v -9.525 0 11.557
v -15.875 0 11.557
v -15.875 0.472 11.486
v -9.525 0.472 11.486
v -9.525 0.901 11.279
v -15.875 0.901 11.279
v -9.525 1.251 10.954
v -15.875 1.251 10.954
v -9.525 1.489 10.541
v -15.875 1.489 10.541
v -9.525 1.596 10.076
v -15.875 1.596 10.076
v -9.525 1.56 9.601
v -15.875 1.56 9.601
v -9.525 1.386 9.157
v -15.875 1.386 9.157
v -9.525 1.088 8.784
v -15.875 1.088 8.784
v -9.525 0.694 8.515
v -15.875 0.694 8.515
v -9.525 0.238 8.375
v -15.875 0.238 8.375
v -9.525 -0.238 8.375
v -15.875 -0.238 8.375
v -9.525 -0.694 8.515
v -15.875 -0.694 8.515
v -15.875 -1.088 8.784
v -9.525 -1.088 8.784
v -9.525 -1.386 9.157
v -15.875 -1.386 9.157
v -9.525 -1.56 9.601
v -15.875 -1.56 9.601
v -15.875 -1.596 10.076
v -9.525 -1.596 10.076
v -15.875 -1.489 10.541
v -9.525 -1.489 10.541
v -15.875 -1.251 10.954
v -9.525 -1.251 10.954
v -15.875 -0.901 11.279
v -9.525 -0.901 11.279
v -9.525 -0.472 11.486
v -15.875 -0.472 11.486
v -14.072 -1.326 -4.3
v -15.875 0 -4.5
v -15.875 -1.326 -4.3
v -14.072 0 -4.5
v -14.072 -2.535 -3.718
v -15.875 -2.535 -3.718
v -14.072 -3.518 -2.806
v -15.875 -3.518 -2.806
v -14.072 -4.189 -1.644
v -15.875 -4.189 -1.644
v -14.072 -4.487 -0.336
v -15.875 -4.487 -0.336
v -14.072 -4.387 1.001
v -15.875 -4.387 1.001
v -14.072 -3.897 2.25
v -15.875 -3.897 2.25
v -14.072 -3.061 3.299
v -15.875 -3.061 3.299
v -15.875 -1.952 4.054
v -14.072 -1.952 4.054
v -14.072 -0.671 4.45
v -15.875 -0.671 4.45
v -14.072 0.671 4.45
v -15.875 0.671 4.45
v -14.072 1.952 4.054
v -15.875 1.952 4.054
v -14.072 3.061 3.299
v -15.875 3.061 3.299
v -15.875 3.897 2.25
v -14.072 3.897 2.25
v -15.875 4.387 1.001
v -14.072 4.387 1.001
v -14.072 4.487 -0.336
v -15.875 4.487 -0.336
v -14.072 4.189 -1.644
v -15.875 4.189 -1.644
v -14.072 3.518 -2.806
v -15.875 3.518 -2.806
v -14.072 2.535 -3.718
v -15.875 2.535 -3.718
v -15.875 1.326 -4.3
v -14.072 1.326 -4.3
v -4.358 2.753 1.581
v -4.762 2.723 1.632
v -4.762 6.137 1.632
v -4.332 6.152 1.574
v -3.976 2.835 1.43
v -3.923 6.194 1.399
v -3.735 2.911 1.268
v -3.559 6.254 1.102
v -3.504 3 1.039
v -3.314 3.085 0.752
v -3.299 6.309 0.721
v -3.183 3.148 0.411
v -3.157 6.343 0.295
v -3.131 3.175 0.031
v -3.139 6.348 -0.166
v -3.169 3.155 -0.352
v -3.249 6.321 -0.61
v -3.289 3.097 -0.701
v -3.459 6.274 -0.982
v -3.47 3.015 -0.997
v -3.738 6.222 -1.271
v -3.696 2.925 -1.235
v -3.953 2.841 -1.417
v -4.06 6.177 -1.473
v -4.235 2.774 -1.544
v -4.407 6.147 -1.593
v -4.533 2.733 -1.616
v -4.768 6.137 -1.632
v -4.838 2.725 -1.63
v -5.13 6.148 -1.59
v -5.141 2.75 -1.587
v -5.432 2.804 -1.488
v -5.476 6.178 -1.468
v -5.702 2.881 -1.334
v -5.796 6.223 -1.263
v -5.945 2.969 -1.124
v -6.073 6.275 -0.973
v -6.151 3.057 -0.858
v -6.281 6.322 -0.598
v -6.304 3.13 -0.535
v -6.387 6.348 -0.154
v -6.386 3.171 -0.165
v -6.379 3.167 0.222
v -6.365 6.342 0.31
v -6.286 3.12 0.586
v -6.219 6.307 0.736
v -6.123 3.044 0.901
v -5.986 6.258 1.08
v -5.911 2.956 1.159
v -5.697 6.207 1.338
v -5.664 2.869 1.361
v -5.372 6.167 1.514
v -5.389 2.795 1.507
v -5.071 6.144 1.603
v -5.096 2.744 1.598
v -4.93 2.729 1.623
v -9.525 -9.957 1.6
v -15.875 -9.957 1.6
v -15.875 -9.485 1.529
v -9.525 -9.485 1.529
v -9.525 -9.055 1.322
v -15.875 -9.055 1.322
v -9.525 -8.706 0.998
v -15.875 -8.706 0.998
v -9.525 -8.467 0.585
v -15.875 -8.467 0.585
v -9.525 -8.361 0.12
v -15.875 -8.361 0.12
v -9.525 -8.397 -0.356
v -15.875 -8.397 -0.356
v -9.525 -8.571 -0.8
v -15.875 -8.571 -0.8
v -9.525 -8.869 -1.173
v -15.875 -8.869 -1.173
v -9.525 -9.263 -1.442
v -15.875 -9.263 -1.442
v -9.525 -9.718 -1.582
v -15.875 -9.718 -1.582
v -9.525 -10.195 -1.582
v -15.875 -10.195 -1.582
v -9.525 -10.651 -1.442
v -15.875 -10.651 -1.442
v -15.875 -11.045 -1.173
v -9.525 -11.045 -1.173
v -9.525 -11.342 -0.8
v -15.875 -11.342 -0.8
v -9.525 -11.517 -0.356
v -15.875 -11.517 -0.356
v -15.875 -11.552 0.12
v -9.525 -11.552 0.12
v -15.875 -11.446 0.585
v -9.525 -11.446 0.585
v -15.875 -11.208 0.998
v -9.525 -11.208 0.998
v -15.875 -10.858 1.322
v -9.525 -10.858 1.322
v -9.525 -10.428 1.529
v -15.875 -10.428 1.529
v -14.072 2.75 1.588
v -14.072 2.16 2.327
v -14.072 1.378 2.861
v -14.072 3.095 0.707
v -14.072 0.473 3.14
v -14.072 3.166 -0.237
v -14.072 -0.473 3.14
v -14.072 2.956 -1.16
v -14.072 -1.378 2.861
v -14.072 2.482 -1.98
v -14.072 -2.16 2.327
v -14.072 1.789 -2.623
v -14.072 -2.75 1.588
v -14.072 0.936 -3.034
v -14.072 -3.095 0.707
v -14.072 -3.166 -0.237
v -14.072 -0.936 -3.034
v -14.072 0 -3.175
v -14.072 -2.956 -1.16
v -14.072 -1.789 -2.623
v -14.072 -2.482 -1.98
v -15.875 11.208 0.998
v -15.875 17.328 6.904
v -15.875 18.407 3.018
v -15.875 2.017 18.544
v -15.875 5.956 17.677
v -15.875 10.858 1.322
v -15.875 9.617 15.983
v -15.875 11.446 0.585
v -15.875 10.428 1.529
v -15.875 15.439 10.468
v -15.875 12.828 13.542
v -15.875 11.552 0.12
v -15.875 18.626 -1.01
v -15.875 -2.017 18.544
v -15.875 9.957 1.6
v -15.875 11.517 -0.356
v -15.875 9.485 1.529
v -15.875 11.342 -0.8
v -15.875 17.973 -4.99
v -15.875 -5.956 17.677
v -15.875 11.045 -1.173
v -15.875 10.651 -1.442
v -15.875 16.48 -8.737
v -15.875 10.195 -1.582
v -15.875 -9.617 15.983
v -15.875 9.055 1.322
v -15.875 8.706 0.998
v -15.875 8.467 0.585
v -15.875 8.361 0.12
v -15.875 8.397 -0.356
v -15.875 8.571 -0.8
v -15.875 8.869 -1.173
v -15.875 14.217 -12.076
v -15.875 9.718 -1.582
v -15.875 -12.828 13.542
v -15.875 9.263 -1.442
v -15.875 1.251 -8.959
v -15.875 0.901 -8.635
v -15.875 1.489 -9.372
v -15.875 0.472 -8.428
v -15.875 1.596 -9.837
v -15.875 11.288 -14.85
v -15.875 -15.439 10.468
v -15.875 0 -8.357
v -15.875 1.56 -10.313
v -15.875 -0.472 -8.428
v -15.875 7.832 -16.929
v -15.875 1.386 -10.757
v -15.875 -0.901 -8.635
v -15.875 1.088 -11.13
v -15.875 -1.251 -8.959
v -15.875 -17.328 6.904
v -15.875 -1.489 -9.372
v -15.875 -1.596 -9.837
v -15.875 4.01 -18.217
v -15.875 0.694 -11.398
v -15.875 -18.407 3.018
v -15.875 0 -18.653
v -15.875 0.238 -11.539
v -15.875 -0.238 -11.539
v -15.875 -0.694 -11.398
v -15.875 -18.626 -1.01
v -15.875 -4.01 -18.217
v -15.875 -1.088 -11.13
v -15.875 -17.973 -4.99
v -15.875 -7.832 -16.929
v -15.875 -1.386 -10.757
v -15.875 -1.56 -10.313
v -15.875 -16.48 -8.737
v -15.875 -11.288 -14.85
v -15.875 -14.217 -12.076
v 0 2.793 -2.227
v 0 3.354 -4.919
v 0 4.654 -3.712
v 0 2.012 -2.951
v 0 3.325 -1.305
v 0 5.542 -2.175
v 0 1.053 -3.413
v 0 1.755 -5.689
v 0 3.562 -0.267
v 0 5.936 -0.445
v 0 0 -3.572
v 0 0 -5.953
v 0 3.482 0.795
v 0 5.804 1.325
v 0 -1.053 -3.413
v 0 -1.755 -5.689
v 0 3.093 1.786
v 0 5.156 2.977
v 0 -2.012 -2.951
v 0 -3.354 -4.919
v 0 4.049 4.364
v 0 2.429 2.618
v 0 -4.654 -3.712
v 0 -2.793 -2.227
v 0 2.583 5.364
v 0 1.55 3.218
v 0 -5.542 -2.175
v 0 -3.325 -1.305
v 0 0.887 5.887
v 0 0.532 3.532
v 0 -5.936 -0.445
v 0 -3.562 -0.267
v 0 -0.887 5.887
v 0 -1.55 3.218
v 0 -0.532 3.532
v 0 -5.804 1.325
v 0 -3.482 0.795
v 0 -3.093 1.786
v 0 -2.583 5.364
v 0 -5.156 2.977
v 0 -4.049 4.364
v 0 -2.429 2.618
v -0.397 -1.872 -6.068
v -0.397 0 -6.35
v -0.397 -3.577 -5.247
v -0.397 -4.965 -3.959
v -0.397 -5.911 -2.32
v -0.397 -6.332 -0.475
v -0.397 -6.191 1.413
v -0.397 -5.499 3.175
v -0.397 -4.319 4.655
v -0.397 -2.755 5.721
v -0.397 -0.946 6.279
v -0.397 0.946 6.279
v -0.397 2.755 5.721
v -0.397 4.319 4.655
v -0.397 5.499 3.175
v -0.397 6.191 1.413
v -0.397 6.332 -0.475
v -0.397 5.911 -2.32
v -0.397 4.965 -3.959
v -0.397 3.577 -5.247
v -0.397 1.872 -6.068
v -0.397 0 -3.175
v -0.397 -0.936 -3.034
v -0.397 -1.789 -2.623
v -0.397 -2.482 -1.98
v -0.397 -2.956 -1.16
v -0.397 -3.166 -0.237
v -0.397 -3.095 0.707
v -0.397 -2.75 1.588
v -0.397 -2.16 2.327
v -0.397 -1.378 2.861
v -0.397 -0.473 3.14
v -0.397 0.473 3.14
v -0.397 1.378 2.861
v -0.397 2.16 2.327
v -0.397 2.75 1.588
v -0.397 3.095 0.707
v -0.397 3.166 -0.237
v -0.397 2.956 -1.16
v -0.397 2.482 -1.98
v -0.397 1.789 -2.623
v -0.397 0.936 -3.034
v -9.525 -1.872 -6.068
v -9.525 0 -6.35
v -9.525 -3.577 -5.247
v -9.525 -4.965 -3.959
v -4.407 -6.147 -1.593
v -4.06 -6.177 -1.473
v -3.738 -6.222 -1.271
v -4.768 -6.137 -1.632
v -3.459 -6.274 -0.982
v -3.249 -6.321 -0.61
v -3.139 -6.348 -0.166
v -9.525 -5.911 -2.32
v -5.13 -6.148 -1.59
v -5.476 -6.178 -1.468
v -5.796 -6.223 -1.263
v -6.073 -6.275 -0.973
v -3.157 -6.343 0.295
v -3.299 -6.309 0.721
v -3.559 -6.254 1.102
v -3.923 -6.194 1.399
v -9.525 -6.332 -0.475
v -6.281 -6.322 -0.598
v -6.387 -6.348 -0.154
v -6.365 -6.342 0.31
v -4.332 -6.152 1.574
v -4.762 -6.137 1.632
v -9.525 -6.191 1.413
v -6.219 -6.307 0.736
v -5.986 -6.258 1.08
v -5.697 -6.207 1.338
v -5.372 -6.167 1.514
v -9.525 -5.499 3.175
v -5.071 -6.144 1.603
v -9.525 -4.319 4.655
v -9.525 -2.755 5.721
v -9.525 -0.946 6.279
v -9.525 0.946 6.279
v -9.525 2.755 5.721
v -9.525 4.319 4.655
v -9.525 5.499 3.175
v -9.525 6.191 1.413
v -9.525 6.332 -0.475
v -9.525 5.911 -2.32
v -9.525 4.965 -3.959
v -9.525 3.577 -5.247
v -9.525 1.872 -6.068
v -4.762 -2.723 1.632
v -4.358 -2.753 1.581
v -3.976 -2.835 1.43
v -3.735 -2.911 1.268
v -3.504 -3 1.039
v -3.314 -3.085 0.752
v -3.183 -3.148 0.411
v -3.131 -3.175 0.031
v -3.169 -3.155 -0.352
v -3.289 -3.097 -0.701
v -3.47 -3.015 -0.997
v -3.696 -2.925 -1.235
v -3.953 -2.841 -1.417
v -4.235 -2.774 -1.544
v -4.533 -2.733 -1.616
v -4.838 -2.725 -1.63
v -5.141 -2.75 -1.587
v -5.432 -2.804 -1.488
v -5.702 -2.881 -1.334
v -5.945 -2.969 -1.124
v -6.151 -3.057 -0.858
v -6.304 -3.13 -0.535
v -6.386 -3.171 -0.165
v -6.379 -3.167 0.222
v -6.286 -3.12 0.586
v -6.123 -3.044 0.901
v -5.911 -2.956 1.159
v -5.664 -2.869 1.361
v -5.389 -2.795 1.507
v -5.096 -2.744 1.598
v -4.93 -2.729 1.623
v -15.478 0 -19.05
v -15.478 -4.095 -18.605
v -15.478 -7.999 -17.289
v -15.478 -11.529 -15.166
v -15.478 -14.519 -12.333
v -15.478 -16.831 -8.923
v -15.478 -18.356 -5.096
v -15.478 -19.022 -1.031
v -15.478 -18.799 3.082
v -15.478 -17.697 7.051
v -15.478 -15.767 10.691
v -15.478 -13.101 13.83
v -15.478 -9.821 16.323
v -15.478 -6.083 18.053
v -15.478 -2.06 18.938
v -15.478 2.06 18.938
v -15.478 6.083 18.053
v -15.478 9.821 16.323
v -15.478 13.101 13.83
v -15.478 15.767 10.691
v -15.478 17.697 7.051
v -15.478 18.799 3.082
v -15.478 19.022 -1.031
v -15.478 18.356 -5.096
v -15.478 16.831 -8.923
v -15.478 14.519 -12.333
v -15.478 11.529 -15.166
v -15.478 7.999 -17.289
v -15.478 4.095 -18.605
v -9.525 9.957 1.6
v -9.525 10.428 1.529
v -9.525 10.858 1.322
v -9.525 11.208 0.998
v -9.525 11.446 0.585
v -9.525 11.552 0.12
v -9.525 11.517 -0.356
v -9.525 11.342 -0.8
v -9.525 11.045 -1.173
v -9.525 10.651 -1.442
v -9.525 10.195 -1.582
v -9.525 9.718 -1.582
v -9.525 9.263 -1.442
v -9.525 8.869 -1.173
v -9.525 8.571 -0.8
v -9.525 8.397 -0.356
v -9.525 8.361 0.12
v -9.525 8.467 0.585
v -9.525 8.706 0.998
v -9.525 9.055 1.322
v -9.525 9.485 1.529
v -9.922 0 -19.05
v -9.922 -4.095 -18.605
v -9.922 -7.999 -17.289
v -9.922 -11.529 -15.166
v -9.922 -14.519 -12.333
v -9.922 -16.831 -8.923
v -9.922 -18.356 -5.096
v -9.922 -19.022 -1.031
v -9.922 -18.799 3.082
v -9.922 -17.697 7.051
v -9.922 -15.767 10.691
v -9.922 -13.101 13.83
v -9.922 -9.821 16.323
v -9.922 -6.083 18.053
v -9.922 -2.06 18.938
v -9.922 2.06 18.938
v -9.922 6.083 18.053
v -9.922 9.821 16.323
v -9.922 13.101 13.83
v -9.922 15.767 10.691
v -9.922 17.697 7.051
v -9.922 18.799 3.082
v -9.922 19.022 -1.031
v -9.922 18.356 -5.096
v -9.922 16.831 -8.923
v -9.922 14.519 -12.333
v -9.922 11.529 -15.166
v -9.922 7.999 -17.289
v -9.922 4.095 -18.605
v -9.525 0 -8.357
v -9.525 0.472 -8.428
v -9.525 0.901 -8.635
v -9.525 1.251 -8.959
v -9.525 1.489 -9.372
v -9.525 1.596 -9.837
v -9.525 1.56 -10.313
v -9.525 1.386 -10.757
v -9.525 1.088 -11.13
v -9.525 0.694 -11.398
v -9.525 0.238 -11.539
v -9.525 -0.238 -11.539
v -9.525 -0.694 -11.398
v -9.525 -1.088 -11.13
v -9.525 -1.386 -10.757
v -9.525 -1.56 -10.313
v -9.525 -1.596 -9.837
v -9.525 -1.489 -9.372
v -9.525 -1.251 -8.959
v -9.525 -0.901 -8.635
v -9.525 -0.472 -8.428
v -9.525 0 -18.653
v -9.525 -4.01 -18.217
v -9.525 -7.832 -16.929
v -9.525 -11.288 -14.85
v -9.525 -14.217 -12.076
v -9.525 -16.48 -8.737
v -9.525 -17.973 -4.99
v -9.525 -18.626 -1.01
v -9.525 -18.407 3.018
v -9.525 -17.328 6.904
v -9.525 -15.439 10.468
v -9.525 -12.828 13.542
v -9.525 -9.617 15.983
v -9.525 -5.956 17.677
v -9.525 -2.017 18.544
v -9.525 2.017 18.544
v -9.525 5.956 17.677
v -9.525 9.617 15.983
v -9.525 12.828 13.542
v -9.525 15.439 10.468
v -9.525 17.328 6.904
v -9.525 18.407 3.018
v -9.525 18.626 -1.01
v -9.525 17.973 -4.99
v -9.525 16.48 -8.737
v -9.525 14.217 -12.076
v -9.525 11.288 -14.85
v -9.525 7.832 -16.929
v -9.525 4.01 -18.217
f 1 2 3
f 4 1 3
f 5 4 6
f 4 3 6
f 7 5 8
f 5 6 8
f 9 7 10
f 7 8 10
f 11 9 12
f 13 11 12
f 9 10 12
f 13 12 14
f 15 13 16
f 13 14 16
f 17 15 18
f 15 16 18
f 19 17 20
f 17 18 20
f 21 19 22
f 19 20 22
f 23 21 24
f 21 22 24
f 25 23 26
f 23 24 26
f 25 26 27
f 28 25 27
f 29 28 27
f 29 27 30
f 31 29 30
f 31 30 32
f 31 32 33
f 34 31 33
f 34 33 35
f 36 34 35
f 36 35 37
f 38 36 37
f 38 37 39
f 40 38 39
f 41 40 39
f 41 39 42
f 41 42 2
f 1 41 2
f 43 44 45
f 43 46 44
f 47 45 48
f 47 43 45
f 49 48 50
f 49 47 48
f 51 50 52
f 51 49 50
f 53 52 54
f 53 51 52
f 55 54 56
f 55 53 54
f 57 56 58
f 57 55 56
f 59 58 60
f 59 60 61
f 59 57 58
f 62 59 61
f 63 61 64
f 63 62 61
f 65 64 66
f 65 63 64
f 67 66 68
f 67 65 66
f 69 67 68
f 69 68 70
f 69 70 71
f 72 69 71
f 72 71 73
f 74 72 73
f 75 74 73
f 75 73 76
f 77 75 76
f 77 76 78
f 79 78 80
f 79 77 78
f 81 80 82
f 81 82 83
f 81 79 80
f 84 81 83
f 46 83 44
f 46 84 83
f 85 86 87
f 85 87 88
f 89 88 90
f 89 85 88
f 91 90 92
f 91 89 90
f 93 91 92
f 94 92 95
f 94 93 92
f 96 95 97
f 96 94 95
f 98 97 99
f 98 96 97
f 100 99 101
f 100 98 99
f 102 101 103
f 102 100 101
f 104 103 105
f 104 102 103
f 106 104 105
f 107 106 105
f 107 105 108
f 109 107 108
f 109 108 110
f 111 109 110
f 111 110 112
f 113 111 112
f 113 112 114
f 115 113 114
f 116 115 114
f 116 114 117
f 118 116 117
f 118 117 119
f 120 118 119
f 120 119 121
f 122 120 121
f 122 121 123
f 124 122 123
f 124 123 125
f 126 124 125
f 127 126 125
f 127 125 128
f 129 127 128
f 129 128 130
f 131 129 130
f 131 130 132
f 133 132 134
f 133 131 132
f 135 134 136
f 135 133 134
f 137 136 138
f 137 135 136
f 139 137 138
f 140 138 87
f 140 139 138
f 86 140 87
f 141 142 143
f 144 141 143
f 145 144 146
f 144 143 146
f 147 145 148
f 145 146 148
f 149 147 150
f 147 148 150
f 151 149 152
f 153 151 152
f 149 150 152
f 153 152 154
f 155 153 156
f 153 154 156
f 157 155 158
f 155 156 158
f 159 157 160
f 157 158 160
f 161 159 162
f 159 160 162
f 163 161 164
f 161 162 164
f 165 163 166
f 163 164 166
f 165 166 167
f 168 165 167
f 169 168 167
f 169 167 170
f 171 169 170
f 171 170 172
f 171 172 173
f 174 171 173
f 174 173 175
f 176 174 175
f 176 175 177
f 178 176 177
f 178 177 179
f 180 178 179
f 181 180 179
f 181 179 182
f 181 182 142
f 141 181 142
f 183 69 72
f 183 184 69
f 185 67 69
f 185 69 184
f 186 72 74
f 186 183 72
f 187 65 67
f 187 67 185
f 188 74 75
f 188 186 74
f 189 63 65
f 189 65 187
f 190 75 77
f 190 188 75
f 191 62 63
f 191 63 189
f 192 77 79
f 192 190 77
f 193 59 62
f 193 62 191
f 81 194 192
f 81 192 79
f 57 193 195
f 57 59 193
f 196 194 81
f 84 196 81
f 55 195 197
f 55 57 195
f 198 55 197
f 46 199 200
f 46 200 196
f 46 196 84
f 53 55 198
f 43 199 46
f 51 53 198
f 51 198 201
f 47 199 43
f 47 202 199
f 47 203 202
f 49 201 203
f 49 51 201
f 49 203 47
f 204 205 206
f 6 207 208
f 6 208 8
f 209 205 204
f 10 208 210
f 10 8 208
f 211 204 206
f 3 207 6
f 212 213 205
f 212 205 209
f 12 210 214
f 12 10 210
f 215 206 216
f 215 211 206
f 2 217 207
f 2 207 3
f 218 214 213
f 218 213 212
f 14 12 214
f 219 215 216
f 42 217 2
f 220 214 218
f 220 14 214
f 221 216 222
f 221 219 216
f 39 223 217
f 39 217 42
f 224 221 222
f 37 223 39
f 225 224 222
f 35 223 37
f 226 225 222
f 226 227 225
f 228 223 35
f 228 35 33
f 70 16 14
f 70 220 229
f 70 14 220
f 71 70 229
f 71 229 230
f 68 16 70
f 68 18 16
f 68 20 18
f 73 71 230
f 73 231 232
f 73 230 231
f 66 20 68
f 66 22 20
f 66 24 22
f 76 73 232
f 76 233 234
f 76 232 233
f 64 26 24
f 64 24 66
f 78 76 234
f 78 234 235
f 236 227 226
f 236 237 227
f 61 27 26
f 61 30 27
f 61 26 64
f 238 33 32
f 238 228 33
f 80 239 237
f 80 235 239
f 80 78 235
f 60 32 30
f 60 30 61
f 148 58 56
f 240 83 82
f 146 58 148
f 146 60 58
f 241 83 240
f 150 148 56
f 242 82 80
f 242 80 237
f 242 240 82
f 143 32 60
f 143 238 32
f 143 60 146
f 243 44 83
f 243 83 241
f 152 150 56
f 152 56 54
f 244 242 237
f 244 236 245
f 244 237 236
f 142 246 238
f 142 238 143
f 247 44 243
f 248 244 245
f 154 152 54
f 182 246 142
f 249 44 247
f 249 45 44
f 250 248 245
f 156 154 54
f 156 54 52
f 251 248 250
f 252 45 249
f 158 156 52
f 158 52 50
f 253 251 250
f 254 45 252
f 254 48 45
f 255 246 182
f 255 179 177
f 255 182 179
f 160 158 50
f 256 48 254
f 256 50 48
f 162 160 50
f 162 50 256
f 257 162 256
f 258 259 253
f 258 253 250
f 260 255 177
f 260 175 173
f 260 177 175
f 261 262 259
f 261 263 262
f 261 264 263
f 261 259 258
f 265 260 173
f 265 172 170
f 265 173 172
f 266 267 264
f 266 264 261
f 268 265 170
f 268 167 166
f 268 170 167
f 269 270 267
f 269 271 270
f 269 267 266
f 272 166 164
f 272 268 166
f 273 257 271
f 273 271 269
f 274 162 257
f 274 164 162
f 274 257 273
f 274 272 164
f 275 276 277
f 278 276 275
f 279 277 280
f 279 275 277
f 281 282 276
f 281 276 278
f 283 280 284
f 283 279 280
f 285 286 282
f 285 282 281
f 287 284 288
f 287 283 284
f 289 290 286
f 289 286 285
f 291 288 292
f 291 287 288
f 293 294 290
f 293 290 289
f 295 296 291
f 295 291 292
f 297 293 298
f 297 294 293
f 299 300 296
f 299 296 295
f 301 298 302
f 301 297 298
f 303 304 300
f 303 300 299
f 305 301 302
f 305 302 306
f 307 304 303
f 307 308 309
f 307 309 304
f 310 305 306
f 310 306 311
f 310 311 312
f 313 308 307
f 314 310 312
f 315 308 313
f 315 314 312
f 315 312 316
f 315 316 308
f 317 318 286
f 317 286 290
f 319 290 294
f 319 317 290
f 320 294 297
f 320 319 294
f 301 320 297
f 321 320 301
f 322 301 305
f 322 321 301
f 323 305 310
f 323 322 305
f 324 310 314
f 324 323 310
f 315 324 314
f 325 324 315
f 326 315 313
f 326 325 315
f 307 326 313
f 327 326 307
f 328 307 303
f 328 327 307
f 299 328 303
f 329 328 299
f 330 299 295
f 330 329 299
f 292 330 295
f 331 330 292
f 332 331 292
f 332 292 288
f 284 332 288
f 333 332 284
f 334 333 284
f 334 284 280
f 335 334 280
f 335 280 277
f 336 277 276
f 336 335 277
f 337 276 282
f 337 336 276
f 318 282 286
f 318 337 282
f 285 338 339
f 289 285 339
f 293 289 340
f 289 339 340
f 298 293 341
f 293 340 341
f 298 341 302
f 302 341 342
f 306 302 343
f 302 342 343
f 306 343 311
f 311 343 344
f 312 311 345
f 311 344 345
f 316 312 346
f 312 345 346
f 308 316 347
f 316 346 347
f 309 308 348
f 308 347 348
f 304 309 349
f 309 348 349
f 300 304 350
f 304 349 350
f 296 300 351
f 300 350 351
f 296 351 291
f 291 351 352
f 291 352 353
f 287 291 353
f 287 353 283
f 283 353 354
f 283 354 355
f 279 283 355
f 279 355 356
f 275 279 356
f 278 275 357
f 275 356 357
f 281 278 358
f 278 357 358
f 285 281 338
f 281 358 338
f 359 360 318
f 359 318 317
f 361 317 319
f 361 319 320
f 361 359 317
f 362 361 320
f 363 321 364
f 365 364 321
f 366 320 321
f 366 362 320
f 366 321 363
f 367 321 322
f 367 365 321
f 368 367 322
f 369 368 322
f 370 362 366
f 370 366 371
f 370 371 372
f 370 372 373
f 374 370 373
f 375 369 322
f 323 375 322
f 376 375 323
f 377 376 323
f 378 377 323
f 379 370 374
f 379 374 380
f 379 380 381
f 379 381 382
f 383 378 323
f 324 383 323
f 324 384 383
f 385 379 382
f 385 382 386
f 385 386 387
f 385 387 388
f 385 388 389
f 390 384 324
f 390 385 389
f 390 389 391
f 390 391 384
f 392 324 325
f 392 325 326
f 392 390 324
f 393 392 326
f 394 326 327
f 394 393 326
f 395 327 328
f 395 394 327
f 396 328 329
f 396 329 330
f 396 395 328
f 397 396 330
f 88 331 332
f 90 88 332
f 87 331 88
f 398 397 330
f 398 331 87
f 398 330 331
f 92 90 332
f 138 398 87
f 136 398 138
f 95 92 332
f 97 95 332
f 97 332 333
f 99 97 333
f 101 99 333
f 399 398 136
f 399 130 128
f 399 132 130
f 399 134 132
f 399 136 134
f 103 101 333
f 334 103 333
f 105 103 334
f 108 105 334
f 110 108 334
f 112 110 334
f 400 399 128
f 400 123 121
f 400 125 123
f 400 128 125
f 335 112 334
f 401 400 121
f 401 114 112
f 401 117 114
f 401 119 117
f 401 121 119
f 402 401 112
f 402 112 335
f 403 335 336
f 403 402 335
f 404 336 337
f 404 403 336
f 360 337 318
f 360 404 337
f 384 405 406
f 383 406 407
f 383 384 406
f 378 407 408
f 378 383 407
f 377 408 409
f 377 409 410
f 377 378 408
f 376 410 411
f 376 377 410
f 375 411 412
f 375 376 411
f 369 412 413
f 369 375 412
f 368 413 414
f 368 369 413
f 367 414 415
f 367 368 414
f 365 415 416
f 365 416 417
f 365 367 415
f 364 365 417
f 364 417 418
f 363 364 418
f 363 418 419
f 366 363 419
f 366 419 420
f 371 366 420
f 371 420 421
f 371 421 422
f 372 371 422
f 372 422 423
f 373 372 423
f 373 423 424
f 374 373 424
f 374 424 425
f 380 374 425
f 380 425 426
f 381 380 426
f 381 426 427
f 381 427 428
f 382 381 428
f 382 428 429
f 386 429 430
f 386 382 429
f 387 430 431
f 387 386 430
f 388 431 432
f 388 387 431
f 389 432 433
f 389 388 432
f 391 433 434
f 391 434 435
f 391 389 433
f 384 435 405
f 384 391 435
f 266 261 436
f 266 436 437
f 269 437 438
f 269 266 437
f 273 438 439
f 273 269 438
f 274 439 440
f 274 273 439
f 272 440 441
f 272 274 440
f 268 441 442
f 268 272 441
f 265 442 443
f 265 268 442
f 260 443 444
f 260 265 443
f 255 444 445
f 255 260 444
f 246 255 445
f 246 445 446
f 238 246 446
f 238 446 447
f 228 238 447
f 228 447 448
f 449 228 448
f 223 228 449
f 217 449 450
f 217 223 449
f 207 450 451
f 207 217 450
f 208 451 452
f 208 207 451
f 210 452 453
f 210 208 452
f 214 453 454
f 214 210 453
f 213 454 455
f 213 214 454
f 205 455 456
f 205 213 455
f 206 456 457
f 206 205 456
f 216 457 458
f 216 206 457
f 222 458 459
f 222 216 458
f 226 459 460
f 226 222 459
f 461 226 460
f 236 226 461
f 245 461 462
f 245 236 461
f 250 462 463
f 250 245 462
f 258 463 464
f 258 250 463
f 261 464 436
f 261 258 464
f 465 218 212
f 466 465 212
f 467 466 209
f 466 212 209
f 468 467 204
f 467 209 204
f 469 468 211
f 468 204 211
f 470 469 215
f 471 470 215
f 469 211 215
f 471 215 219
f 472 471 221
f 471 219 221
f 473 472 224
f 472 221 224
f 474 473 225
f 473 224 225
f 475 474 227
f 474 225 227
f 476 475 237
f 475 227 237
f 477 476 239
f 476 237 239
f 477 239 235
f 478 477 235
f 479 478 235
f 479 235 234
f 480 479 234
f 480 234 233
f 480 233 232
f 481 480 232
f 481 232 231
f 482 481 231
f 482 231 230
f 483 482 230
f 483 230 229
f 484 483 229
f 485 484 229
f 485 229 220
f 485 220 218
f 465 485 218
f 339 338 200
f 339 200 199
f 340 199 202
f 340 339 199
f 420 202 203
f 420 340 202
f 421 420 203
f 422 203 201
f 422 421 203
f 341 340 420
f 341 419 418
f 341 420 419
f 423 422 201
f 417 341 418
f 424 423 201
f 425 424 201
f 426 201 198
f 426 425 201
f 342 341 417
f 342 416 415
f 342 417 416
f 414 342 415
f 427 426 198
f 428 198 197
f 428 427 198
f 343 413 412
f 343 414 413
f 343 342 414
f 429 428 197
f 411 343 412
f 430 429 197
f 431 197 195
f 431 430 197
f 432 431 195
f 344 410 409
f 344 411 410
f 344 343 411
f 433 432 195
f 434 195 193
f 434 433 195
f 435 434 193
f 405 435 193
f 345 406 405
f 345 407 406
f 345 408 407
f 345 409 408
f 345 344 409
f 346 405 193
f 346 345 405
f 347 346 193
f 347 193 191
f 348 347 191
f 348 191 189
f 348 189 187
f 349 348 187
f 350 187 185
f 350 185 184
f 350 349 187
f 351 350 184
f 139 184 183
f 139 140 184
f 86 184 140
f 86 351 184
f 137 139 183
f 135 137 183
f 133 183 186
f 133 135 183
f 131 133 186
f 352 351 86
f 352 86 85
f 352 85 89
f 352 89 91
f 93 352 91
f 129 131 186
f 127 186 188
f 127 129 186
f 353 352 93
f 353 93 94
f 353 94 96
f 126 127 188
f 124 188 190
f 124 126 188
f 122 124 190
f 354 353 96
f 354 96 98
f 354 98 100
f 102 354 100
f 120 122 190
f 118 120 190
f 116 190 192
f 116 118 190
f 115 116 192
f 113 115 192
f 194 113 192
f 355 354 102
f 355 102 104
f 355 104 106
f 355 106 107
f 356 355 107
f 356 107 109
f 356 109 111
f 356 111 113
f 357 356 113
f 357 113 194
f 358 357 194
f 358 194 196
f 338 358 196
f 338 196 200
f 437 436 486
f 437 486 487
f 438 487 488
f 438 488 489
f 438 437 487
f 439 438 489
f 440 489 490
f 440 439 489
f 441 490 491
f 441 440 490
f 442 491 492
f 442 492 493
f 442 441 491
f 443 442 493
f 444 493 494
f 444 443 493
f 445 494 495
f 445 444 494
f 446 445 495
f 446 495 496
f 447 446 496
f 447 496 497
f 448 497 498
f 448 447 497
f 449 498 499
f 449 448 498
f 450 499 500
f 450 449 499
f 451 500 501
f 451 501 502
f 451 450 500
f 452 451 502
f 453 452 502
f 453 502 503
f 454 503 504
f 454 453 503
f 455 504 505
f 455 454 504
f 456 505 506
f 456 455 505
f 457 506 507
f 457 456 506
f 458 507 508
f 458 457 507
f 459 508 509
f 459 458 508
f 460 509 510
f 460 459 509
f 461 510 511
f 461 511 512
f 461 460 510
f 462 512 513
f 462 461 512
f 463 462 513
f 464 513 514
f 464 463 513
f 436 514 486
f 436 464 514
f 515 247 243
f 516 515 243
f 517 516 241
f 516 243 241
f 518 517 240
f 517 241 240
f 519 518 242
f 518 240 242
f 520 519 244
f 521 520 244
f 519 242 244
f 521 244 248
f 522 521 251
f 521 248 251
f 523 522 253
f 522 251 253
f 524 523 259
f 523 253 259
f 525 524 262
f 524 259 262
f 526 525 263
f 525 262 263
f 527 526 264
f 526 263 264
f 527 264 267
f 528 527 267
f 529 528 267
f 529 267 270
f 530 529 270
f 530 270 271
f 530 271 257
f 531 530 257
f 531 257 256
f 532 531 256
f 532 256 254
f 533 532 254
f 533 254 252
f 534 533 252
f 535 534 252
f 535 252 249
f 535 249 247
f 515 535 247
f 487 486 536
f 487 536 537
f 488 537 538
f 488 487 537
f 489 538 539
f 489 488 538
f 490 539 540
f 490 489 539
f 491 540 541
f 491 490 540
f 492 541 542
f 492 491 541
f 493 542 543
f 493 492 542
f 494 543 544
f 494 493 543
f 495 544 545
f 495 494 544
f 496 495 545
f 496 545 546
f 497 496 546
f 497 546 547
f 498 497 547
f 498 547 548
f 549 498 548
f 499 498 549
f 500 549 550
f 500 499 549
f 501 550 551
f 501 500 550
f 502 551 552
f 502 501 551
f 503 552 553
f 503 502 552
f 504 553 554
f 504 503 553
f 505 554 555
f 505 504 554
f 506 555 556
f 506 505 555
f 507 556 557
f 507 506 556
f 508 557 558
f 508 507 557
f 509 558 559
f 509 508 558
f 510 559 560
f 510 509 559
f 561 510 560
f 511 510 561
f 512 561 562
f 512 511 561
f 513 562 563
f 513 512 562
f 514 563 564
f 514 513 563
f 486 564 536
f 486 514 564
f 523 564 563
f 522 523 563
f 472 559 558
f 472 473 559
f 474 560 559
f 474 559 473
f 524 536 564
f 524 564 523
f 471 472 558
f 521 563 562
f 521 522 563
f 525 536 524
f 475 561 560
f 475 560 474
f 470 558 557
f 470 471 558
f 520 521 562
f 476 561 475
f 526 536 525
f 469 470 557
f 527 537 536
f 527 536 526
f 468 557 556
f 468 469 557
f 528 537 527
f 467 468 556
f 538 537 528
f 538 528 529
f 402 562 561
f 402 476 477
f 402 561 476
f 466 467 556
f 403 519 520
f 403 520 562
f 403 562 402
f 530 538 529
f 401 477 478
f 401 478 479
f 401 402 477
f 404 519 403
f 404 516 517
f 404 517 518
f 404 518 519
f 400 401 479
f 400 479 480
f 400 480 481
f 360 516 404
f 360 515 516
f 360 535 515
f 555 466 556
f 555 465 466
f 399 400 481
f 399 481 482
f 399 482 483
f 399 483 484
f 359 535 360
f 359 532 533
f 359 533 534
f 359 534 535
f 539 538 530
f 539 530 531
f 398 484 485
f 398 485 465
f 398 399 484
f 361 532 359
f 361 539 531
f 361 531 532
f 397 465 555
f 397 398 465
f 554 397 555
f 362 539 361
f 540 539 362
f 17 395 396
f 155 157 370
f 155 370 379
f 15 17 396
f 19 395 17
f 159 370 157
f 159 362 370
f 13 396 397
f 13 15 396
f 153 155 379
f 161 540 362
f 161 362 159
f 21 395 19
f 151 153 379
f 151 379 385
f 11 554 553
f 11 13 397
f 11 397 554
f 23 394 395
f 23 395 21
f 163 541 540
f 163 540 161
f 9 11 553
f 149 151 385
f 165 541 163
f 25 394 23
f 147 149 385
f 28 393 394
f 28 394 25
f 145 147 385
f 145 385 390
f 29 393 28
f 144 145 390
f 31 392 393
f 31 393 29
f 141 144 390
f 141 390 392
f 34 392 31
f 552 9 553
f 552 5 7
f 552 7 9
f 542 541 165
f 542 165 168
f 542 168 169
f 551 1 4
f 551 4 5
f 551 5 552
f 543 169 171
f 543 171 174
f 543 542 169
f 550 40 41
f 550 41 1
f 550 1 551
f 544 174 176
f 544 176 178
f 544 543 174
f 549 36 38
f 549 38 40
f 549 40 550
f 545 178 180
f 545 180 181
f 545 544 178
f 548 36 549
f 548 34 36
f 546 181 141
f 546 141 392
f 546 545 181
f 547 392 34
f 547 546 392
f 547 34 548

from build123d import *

# Parameters (mm, degrees)
CUT_EXTRUDE1_DEPTH      = 32.270123521
CUT_EXTRUDE1_DEPTH_BACK = 32.270123521
SKETCH3_R               = 1.63195
SKETCH2_R               = 1.6
CUT_EXTRUDE2_DEPTH      = 32.270123571
CHAMFER1_SIZE           = 0.396875


with BuildPart() as part:
    # Sketch1 → Revolve1 (revolve)
    with BuildSketch(Plane.XY):
        Polygon((0, 3.175), (0, 6.35), (-9.525, 6.35), (-9.525, 19.05), (-15.875, 19.05), (-15.875, 4.5), (-14.0716, 4.5), (-14.0716, 3.175), align=None)
    revolve(axis=Axis((0, 0, 0), (-1, 0, 0)))

    # Sketch3 → Cut-Extrude1 (cut, two sides: drawn at the far end of the back side and taken through both)
    with BuildSketch(Plane(origin=(0, 0, 0), x_dir=(1, 0, 0), z_dir=(0, 1, 0)).offset(-CUT_EXTRUDE1_DEPTH_BACK)):
        with Locations((-4.7625, 0)):
            Circle(SKETCH3_R)
    extrude(amount=CUT_EXTRUDE1_DEPTH + CUT_EXTRUDE1_DEPTH_BACK, mode=Mode.SUBTRACT)

    # Sketch2 → Cut-Extrude2 (cut, through all)
    with BuildSketch(Plane.ZY.offset(15.875)):
        with Locations((-9.9568, 0)):
            Circle(SKETCH2_R)
        with Locations((0, 9.9568)):
            Circle(SKETCH2_R)
        with Locations((9.9568, 0)):
            Circle(SKETCH2_R)
        with Locations((0, -9.9568)):
            Circle(SKETCH2_R)
    extrude(amount=-CUT_EXTRUDE2_DEPTH, mode=Mode.SUBTRACT)

    # Chamfer1
    chamfer1_edges = [part.edges().sort_by_distance(p)[0] for p in [
        (0, -3.175, 0),
        (0, -6.35, 0),
        (-9.525, -19.05, 0),
        (-15.875, -19.05, 0),
    ]]
    chamfer(chamfer1_edges, length=CHAMFER1_SIZE)


solid = part.part
